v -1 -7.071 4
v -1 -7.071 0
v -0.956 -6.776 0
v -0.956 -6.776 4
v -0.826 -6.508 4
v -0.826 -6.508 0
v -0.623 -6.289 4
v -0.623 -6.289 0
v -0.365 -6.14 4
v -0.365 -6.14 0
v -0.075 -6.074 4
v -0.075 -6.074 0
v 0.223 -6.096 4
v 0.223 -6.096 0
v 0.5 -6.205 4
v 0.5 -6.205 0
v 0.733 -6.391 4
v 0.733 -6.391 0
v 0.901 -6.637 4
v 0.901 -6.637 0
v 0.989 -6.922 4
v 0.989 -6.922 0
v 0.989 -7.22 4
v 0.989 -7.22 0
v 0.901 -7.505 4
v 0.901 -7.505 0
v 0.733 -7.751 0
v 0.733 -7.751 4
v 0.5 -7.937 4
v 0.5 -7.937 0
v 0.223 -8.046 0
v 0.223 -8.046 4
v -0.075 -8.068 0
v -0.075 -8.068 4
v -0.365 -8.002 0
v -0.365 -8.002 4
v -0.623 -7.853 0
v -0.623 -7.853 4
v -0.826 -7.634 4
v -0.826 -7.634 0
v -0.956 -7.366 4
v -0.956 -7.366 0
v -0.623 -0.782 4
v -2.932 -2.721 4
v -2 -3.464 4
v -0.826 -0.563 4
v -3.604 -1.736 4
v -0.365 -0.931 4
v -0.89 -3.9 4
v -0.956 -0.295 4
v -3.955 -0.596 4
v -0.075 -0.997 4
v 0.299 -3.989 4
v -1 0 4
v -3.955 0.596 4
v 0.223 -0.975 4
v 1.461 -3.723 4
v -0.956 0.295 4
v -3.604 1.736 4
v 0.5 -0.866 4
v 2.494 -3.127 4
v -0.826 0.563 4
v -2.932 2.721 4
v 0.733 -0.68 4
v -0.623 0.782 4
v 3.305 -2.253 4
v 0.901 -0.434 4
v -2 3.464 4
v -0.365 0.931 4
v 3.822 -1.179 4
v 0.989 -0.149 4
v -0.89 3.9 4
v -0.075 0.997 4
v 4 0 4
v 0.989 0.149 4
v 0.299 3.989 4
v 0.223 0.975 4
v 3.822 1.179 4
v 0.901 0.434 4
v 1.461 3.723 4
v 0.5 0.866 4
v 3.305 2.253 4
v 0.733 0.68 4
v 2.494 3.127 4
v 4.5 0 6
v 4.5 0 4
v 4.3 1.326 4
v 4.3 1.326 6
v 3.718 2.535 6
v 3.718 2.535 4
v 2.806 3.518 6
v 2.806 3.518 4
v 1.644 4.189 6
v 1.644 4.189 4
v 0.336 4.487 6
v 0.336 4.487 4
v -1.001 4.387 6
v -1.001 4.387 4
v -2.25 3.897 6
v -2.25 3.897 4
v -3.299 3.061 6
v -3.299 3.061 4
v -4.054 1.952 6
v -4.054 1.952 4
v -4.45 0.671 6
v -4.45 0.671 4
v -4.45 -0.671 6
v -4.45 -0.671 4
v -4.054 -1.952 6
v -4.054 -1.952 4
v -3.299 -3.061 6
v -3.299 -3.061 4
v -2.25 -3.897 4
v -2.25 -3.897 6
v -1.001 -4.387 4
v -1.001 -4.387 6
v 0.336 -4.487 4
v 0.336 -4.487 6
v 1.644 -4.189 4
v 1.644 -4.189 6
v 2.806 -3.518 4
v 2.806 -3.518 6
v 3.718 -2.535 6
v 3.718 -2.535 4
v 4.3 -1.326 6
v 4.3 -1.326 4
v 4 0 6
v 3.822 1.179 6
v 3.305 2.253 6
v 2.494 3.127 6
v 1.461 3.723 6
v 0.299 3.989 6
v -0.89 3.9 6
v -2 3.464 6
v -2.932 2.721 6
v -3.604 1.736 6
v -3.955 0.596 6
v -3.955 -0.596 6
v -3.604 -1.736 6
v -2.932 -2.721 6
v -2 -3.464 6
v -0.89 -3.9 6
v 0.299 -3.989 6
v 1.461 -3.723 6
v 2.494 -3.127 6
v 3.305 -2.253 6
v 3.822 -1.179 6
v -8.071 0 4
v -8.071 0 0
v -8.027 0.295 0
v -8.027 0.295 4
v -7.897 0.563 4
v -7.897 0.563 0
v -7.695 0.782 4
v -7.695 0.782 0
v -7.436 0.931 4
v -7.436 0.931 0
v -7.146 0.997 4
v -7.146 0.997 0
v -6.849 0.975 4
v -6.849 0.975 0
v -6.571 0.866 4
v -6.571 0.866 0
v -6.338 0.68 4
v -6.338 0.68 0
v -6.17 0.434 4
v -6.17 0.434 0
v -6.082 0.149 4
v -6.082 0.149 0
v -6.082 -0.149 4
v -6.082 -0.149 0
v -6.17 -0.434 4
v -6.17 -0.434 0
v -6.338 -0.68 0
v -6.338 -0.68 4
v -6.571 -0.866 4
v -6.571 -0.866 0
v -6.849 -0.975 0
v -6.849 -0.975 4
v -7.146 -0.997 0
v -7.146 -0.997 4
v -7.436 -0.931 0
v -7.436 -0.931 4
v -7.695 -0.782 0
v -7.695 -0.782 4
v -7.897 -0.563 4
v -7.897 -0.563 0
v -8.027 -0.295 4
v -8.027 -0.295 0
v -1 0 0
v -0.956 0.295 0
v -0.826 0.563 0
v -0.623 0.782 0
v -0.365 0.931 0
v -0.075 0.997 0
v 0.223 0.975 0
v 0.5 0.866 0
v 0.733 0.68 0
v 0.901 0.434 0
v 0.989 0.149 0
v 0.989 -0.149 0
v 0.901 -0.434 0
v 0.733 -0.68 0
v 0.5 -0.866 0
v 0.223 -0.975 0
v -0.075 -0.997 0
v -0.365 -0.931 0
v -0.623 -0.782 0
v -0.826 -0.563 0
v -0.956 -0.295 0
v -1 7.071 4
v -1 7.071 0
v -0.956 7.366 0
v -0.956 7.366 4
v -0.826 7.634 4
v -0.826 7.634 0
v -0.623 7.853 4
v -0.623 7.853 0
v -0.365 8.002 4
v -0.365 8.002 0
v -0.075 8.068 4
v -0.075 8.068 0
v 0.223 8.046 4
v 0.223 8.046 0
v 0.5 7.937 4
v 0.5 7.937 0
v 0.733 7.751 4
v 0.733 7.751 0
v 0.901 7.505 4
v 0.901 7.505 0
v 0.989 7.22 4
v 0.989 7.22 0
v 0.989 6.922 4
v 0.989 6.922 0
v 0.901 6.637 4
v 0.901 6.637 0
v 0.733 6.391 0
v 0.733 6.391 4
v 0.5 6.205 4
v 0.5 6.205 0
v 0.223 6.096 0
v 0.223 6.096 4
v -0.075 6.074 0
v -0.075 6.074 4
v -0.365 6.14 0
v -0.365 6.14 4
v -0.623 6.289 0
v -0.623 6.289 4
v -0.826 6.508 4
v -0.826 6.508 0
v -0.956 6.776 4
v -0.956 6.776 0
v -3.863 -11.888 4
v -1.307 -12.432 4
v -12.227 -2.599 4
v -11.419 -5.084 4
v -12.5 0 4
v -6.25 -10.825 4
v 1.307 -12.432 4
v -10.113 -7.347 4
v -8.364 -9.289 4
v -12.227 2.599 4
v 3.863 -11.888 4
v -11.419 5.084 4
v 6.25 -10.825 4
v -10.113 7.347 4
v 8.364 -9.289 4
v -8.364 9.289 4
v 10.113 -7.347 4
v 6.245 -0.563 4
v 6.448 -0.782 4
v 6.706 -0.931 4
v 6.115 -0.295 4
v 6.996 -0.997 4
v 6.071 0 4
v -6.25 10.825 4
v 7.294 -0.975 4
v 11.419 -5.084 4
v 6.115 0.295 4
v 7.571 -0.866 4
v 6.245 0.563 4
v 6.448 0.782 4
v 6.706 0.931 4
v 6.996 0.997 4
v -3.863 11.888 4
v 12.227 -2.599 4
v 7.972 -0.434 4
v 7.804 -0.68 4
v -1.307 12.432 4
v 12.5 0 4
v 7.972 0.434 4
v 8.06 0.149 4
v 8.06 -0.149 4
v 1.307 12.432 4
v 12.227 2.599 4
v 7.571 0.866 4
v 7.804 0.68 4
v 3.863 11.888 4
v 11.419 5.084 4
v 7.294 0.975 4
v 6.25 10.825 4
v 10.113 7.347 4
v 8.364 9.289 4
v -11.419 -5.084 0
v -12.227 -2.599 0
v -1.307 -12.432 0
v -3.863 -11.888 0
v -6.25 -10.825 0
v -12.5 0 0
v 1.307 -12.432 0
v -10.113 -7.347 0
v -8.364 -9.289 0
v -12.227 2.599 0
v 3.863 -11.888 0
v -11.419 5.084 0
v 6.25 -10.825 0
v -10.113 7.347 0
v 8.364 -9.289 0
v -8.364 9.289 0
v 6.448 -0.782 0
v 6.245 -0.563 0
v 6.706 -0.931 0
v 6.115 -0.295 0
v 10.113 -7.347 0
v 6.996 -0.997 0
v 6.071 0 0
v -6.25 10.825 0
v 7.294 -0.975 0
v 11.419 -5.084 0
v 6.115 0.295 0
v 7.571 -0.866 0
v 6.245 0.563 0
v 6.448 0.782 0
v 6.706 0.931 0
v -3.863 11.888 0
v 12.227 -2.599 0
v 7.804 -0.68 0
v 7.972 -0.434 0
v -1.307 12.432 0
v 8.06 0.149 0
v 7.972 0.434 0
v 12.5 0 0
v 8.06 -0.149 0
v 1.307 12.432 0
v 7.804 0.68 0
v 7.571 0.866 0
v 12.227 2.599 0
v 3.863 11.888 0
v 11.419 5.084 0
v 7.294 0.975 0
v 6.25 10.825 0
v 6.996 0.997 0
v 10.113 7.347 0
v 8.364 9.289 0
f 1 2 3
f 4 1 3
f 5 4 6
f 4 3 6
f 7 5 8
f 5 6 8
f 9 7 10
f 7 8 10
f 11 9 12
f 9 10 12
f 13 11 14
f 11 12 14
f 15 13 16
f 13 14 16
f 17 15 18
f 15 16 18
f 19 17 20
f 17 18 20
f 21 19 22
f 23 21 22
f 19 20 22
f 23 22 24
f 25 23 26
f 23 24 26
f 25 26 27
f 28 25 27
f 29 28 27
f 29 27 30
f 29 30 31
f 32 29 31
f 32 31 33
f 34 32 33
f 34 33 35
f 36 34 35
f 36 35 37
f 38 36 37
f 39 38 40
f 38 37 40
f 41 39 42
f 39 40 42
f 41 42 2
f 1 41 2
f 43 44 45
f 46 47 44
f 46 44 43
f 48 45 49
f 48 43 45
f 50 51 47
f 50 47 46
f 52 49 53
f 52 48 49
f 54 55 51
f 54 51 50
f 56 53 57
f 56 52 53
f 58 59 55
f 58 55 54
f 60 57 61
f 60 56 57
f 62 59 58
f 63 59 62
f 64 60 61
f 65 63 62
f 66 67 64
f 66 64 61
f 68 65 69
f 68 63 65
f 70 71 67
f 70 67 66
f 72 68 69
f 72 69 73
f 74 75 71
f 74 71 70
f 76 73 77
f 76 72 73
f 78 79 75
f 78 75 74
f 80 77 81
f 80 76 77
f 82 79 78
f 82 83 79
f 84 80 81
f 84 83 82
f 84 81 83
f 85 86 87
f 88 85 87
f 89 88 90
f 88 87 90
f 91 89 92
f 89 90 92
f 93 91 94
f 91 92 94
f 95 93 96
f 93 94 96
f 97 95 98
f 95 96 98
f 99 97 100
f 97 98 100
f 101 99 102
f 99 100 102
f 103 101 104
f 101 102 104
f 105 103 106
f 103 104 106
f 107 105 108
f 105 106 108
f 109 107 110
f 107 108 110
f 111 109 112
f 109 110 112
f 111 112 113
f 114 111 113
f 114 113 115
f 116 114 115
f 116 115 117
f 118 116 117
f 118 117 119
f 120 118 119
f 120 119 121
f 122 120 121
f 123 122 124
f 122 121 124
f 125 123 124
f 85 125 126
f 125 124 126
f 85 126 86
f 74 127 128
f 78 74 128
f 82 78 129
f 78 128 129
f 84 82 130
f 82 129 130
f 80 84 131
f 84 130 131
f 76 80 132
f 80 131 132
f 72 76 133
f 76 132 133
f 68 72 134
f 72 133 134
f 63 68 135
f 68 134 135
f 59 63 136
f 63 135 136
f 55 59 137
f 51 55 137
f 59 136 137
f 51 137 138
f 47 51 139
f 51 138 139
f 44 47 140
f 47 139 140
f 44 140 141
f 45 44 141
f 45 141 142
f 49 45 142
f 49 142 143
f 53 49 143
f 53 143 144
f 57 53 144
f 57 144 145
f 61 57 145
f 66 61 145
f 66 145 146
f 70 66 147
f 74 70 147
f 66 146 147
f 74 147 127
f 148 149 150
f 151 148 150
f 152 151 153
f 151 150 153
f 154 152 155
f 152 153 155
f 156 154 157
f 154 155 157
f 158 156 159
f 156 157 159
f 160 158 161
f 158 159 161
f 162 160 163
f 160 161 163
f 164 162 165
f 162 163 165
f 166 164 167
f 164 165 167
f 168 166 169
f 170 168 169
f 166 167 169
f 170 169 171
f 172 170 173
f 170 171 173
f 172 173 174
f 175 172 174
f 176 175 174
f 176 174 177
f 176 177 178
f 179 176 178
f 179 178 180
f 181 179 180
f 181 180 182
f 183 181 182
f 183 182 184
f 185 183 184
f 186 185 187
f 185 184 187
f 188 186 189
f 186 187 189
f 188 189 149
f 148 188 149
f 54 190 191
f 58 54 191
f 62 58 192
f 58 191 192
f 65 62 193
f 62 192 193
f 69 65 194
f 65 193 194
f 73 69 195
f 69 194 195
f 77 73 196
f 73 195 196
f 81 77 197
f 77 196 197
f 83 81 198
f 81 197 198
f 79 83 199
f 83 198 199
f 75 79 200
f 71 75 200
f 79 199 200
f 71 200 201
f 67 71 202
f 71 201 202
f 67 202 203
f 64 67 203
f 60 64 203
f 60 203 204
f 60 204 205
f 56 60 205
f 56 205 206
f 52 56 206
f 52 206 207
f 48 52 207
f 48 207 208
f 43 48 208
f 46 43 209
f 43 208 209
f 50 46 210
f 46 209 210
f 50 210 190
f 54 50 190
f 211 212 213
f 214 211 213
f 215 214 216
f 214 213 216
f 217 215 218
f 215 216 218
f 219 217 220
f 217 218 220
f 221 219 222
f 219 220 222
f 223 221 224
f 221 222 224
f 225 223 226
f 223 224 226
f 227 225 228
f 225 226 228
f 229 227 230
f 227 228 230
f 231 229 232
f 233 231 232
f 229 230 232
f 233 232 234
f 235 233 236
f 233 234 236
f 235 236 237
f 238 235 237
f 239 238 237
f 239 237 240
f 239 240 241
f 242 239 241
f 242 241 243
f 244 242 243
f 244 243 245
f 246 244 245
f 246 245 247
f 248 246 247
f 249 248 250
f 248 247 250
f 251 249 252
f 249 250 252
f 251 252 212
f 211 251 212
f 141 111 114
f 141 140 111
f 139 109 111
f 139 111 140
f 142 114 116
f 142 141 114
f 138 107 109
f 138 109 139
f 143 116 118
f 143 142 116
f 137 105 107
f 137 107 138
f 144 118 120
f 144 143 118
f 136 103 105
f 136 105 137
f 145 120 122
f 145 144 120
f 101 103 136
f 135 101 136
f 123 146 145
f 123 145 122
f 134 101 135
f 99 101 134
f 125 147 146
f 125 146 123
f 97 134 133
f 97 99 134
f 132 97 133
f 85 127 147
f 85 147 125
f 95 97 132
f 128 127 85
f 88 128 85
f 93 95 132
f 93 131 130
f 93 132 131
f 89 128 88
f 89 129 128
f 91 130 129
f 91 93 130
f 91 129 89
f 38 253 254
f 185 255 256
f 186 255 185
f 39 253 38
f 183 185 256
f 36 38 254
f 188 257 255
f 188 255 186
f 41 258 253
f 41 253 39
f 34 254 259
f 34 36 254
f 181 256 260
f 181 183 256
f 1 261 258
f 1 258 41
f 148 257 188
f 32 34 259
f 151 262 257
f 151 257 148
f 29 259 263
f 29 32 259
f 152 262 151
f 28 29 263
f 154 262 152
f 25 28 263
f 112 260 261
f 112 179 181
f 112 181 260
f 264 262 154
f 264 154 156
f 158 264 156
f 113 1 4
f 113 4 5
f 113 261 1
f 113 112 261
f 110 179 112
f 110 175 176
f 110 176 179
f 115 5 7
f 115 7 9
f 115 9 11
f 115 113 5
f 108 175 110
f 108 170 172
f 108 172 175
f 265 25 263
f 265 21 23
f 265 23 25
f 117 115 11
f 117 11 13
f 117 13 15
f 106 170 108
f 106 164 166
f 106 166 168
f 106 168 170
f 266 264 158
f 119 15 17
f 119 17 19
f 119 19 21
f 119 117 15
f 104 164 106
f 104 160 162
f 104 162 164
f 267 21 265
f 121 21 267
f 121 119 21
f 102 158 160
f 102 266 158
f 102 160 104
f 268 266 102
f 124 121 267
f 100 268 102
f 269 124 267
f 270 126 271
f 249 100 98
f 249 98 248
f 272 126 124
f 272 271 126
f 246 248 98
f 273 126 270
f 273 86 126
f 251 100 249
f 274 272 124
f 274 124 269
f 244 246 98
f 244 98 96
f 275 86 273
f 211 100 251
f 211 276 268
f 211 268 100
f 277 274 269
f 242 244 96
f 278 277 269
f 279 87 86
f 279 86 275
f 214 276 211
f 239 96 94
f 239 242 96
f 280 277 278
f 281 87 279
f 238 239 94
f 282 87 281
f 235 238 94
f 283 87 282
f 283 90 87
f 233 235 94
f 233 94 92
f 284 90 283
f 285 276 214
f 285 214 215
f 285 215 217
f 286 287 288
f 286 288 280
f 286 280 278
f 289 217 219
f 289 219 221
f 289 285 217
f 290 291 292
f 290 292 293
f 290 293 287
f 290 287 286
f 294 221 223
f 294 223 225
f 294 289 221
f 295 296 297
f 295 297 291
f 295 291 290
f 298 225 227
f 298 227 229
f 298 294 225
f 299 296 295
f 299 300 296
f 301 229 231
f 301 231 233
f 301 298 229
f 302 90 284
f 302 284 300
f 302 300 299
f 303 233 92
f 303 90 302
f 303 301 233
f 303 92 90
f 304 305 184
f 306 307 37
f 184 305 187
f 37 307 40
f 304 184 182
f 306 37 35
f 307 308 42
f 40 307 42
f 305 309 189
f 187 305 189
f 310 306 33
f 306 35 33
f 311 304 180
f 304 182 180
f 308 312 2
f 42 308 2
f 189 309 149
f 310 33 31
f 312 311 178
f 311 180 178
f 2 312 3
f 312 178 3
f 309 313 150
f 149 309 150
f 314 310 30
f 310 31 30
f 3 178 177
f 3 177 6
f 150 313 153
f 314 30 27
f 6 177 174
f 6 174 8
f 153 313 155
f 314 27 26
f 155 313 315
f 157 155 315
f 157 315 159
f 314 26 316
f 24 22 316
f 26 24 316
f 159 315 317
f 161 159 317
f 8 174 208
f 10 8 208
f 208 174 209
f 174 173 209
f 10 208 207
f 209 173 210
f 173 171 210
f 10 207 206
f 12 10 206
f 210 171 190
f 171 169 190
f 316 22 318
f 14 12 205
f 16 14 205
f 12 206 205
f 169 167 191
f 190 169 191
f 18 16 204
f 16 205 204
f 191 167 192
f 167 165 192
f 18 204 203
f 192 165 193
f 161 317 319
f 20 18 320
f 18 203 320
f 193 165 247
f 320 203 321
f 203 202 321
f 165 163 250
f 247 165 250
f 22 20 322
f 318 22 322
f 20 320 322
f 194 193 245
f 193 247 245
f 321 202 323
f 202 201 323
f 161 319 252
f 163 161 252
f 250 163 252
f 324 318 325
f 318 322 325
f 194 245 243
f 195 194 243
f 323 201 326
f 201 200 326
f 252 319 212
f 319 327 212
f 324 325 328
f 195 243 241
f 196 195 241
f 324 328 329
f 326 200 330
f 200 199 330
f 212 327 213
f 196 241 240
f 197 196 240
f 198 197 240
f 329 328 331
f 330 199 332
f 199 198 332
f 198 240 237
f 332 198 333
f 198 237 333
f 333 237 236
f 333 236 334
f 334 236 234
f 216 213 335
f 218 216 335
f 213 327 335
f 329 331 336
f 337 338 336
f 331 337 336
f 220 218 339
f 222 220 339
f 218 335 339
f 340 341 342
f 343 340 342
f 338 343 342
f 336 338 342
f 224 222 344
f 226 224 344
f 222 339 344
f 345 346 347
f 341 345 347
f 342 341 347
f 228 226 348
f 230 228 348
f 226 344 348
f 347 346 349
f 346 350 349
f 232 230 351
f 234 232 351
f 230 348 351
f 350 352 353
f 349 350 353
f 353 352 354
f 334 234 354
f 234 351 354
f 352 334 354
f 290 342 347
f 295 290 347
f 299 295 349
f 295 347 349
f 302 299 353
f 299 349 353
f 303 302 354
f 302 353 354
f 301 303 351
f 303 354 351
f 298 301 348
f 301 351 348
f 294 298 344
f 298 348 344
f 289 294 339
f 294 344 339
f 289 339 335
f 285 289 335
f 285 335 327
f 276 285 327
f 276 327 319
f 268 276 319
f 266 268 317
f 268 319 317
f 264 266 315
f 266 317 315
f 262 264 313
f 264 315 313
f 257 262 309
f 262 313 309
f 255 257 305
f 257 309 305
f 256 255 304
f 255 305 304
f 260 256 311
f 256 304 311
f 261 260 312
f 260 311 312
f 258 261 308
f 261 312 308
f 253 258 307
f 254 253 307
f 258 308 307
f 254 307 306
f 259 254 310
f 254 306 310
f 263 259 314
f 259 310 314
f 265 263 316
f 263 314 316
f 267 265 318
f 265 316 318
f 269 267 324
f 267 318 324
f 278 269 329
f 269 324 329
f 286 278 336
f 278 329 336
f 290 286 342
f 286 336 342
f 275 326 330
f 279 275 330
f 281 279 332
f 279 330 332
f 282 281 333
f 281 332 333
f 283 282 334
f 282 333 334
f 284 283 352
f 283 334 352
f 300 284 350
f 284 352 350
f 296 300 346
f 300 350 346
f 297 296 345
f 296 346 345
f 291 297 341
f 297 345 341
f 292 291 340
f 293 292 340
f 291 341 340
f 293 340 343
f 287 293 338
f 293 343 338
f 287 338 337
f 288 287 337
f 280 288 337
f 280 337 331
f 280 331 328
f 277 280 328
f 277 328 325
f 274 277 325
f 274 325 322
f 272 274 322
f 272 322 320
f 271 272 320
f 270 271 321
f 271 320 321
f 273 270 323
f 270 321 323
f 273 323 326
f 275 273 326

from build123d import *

# Parameters (mm, degrees)
SKETCH_1_R          = 12.5
EXTRUDE_1_DEPTH     = 4
SKETCH_2_R          = 4.5
EXTRUDE_2_DEPTH     = 2
SKETCH_3_R          = 1
CUT_EXTRUDE_3_DEPTH = 19.12456896
SKETCH_4_R          = 1
CUT_EXTRUDE_4_DEPTH = 19.668154703
SKETCH_5_R          = 4
CUT_EXTRUDE_5_DEPTH = 2
SKETCH_6_R          = 12.5
EXTRUDE_3_DEPTH     = 4
SKETCH_7_R          = 1
CUT_EXTRUDE_6_DEPTH = 4


with BuildPart() as part:
    # 草图1 → 凸台-拉伸1 (new body)
    with BuildSketch(Plane.XY):
        Circle(SKETCH_1_R)
    extrude(amount=EXTRUDE_1_DEPTH)

    # 草图2 → 凸台-拉伸2 (add)
    with BuildSketch(Plane.XY.offset(4)):
        Circle(SKETCH_2_R)
    extrude(amount=EXTRUDE_2_DEPTH)

    # 草图3 → 切除-拉伸3 (cut, through all)
    with BuildSketch(Plane.XY.offset(4)):
        with Locations((4.955921216, 5)):
            Circle(SKETCH_3_R)
        with Locations(Location((4.955921216, -5, 0), (0, 0, 180))):
            Circle(SKETCH_3_R)
        with Locations((-4.955921216, -5)):
            Circle(SKETCH_3_R)
        with Locations(Location((-4.955921216, 5, 0), (0, 0, 180))):
            Circle(SKETCH_3_R)
    extrude(amount=-CUT_EXTRUDE_3_DEPTH, mode=Mode.SUBTRACT)

    # 草图4 → 切除-拉伸4 (cut, through all)
    with BuildSketch(Plane.XY.offset(6)):
        Circle(SKETCH_4_R)
    extrude(amount=-CUT_EXTRUDE_4_DEPTH, mode=Mode.SUBTRACT)

    # 草图5 → 切除-拉伸5 (cut)
    with BuildSketch(Plane.XY.offset(6)):
        Circle(SKETCH_5_R)
    extrude(amount=-CUT_EXTRUDE_5_DEPTH, mode=Mode.SUBTRACT)

    # 草图6 → 凸台-拉伸3 (add)
    with BuildSketch(Plane(origin=(0, 0, 0), x_dir=(-1, 0, 0), z_dir=(0, 0, -1))):
        with Locations(Location((0, 0, 0), (0, 0, 180))):
            Circle(SKETCH_6_R)
    extrude(amount=-EXTRUDE_3_DEPTH)

    # 草图7 → 切除-拉伸6 (cut)
    with BuildSketch(Plane(origin=(0, 0, 0), x_dir=(-1, 0, 0), z_dir=(0, 0, -1))):
        with Locations((7.071067812, 0)):
            Circle(SKETCH_7_R)
        Circle(SKETCH_7_R)
        with Locations((0, 7.071067812)):
            Circle(SKETCH_7_R)
        with Locations((-7.071067812, 0)):
            Circle(SKETCH_7_R)
        with Locations((0, -7.071067812)):
            Circle(SKETCH_7_R)
    extrude(amount=-CUT_EXTRUDE_6_DEPTH, mode=Mode.SUBTRACT)


solid = part.part
